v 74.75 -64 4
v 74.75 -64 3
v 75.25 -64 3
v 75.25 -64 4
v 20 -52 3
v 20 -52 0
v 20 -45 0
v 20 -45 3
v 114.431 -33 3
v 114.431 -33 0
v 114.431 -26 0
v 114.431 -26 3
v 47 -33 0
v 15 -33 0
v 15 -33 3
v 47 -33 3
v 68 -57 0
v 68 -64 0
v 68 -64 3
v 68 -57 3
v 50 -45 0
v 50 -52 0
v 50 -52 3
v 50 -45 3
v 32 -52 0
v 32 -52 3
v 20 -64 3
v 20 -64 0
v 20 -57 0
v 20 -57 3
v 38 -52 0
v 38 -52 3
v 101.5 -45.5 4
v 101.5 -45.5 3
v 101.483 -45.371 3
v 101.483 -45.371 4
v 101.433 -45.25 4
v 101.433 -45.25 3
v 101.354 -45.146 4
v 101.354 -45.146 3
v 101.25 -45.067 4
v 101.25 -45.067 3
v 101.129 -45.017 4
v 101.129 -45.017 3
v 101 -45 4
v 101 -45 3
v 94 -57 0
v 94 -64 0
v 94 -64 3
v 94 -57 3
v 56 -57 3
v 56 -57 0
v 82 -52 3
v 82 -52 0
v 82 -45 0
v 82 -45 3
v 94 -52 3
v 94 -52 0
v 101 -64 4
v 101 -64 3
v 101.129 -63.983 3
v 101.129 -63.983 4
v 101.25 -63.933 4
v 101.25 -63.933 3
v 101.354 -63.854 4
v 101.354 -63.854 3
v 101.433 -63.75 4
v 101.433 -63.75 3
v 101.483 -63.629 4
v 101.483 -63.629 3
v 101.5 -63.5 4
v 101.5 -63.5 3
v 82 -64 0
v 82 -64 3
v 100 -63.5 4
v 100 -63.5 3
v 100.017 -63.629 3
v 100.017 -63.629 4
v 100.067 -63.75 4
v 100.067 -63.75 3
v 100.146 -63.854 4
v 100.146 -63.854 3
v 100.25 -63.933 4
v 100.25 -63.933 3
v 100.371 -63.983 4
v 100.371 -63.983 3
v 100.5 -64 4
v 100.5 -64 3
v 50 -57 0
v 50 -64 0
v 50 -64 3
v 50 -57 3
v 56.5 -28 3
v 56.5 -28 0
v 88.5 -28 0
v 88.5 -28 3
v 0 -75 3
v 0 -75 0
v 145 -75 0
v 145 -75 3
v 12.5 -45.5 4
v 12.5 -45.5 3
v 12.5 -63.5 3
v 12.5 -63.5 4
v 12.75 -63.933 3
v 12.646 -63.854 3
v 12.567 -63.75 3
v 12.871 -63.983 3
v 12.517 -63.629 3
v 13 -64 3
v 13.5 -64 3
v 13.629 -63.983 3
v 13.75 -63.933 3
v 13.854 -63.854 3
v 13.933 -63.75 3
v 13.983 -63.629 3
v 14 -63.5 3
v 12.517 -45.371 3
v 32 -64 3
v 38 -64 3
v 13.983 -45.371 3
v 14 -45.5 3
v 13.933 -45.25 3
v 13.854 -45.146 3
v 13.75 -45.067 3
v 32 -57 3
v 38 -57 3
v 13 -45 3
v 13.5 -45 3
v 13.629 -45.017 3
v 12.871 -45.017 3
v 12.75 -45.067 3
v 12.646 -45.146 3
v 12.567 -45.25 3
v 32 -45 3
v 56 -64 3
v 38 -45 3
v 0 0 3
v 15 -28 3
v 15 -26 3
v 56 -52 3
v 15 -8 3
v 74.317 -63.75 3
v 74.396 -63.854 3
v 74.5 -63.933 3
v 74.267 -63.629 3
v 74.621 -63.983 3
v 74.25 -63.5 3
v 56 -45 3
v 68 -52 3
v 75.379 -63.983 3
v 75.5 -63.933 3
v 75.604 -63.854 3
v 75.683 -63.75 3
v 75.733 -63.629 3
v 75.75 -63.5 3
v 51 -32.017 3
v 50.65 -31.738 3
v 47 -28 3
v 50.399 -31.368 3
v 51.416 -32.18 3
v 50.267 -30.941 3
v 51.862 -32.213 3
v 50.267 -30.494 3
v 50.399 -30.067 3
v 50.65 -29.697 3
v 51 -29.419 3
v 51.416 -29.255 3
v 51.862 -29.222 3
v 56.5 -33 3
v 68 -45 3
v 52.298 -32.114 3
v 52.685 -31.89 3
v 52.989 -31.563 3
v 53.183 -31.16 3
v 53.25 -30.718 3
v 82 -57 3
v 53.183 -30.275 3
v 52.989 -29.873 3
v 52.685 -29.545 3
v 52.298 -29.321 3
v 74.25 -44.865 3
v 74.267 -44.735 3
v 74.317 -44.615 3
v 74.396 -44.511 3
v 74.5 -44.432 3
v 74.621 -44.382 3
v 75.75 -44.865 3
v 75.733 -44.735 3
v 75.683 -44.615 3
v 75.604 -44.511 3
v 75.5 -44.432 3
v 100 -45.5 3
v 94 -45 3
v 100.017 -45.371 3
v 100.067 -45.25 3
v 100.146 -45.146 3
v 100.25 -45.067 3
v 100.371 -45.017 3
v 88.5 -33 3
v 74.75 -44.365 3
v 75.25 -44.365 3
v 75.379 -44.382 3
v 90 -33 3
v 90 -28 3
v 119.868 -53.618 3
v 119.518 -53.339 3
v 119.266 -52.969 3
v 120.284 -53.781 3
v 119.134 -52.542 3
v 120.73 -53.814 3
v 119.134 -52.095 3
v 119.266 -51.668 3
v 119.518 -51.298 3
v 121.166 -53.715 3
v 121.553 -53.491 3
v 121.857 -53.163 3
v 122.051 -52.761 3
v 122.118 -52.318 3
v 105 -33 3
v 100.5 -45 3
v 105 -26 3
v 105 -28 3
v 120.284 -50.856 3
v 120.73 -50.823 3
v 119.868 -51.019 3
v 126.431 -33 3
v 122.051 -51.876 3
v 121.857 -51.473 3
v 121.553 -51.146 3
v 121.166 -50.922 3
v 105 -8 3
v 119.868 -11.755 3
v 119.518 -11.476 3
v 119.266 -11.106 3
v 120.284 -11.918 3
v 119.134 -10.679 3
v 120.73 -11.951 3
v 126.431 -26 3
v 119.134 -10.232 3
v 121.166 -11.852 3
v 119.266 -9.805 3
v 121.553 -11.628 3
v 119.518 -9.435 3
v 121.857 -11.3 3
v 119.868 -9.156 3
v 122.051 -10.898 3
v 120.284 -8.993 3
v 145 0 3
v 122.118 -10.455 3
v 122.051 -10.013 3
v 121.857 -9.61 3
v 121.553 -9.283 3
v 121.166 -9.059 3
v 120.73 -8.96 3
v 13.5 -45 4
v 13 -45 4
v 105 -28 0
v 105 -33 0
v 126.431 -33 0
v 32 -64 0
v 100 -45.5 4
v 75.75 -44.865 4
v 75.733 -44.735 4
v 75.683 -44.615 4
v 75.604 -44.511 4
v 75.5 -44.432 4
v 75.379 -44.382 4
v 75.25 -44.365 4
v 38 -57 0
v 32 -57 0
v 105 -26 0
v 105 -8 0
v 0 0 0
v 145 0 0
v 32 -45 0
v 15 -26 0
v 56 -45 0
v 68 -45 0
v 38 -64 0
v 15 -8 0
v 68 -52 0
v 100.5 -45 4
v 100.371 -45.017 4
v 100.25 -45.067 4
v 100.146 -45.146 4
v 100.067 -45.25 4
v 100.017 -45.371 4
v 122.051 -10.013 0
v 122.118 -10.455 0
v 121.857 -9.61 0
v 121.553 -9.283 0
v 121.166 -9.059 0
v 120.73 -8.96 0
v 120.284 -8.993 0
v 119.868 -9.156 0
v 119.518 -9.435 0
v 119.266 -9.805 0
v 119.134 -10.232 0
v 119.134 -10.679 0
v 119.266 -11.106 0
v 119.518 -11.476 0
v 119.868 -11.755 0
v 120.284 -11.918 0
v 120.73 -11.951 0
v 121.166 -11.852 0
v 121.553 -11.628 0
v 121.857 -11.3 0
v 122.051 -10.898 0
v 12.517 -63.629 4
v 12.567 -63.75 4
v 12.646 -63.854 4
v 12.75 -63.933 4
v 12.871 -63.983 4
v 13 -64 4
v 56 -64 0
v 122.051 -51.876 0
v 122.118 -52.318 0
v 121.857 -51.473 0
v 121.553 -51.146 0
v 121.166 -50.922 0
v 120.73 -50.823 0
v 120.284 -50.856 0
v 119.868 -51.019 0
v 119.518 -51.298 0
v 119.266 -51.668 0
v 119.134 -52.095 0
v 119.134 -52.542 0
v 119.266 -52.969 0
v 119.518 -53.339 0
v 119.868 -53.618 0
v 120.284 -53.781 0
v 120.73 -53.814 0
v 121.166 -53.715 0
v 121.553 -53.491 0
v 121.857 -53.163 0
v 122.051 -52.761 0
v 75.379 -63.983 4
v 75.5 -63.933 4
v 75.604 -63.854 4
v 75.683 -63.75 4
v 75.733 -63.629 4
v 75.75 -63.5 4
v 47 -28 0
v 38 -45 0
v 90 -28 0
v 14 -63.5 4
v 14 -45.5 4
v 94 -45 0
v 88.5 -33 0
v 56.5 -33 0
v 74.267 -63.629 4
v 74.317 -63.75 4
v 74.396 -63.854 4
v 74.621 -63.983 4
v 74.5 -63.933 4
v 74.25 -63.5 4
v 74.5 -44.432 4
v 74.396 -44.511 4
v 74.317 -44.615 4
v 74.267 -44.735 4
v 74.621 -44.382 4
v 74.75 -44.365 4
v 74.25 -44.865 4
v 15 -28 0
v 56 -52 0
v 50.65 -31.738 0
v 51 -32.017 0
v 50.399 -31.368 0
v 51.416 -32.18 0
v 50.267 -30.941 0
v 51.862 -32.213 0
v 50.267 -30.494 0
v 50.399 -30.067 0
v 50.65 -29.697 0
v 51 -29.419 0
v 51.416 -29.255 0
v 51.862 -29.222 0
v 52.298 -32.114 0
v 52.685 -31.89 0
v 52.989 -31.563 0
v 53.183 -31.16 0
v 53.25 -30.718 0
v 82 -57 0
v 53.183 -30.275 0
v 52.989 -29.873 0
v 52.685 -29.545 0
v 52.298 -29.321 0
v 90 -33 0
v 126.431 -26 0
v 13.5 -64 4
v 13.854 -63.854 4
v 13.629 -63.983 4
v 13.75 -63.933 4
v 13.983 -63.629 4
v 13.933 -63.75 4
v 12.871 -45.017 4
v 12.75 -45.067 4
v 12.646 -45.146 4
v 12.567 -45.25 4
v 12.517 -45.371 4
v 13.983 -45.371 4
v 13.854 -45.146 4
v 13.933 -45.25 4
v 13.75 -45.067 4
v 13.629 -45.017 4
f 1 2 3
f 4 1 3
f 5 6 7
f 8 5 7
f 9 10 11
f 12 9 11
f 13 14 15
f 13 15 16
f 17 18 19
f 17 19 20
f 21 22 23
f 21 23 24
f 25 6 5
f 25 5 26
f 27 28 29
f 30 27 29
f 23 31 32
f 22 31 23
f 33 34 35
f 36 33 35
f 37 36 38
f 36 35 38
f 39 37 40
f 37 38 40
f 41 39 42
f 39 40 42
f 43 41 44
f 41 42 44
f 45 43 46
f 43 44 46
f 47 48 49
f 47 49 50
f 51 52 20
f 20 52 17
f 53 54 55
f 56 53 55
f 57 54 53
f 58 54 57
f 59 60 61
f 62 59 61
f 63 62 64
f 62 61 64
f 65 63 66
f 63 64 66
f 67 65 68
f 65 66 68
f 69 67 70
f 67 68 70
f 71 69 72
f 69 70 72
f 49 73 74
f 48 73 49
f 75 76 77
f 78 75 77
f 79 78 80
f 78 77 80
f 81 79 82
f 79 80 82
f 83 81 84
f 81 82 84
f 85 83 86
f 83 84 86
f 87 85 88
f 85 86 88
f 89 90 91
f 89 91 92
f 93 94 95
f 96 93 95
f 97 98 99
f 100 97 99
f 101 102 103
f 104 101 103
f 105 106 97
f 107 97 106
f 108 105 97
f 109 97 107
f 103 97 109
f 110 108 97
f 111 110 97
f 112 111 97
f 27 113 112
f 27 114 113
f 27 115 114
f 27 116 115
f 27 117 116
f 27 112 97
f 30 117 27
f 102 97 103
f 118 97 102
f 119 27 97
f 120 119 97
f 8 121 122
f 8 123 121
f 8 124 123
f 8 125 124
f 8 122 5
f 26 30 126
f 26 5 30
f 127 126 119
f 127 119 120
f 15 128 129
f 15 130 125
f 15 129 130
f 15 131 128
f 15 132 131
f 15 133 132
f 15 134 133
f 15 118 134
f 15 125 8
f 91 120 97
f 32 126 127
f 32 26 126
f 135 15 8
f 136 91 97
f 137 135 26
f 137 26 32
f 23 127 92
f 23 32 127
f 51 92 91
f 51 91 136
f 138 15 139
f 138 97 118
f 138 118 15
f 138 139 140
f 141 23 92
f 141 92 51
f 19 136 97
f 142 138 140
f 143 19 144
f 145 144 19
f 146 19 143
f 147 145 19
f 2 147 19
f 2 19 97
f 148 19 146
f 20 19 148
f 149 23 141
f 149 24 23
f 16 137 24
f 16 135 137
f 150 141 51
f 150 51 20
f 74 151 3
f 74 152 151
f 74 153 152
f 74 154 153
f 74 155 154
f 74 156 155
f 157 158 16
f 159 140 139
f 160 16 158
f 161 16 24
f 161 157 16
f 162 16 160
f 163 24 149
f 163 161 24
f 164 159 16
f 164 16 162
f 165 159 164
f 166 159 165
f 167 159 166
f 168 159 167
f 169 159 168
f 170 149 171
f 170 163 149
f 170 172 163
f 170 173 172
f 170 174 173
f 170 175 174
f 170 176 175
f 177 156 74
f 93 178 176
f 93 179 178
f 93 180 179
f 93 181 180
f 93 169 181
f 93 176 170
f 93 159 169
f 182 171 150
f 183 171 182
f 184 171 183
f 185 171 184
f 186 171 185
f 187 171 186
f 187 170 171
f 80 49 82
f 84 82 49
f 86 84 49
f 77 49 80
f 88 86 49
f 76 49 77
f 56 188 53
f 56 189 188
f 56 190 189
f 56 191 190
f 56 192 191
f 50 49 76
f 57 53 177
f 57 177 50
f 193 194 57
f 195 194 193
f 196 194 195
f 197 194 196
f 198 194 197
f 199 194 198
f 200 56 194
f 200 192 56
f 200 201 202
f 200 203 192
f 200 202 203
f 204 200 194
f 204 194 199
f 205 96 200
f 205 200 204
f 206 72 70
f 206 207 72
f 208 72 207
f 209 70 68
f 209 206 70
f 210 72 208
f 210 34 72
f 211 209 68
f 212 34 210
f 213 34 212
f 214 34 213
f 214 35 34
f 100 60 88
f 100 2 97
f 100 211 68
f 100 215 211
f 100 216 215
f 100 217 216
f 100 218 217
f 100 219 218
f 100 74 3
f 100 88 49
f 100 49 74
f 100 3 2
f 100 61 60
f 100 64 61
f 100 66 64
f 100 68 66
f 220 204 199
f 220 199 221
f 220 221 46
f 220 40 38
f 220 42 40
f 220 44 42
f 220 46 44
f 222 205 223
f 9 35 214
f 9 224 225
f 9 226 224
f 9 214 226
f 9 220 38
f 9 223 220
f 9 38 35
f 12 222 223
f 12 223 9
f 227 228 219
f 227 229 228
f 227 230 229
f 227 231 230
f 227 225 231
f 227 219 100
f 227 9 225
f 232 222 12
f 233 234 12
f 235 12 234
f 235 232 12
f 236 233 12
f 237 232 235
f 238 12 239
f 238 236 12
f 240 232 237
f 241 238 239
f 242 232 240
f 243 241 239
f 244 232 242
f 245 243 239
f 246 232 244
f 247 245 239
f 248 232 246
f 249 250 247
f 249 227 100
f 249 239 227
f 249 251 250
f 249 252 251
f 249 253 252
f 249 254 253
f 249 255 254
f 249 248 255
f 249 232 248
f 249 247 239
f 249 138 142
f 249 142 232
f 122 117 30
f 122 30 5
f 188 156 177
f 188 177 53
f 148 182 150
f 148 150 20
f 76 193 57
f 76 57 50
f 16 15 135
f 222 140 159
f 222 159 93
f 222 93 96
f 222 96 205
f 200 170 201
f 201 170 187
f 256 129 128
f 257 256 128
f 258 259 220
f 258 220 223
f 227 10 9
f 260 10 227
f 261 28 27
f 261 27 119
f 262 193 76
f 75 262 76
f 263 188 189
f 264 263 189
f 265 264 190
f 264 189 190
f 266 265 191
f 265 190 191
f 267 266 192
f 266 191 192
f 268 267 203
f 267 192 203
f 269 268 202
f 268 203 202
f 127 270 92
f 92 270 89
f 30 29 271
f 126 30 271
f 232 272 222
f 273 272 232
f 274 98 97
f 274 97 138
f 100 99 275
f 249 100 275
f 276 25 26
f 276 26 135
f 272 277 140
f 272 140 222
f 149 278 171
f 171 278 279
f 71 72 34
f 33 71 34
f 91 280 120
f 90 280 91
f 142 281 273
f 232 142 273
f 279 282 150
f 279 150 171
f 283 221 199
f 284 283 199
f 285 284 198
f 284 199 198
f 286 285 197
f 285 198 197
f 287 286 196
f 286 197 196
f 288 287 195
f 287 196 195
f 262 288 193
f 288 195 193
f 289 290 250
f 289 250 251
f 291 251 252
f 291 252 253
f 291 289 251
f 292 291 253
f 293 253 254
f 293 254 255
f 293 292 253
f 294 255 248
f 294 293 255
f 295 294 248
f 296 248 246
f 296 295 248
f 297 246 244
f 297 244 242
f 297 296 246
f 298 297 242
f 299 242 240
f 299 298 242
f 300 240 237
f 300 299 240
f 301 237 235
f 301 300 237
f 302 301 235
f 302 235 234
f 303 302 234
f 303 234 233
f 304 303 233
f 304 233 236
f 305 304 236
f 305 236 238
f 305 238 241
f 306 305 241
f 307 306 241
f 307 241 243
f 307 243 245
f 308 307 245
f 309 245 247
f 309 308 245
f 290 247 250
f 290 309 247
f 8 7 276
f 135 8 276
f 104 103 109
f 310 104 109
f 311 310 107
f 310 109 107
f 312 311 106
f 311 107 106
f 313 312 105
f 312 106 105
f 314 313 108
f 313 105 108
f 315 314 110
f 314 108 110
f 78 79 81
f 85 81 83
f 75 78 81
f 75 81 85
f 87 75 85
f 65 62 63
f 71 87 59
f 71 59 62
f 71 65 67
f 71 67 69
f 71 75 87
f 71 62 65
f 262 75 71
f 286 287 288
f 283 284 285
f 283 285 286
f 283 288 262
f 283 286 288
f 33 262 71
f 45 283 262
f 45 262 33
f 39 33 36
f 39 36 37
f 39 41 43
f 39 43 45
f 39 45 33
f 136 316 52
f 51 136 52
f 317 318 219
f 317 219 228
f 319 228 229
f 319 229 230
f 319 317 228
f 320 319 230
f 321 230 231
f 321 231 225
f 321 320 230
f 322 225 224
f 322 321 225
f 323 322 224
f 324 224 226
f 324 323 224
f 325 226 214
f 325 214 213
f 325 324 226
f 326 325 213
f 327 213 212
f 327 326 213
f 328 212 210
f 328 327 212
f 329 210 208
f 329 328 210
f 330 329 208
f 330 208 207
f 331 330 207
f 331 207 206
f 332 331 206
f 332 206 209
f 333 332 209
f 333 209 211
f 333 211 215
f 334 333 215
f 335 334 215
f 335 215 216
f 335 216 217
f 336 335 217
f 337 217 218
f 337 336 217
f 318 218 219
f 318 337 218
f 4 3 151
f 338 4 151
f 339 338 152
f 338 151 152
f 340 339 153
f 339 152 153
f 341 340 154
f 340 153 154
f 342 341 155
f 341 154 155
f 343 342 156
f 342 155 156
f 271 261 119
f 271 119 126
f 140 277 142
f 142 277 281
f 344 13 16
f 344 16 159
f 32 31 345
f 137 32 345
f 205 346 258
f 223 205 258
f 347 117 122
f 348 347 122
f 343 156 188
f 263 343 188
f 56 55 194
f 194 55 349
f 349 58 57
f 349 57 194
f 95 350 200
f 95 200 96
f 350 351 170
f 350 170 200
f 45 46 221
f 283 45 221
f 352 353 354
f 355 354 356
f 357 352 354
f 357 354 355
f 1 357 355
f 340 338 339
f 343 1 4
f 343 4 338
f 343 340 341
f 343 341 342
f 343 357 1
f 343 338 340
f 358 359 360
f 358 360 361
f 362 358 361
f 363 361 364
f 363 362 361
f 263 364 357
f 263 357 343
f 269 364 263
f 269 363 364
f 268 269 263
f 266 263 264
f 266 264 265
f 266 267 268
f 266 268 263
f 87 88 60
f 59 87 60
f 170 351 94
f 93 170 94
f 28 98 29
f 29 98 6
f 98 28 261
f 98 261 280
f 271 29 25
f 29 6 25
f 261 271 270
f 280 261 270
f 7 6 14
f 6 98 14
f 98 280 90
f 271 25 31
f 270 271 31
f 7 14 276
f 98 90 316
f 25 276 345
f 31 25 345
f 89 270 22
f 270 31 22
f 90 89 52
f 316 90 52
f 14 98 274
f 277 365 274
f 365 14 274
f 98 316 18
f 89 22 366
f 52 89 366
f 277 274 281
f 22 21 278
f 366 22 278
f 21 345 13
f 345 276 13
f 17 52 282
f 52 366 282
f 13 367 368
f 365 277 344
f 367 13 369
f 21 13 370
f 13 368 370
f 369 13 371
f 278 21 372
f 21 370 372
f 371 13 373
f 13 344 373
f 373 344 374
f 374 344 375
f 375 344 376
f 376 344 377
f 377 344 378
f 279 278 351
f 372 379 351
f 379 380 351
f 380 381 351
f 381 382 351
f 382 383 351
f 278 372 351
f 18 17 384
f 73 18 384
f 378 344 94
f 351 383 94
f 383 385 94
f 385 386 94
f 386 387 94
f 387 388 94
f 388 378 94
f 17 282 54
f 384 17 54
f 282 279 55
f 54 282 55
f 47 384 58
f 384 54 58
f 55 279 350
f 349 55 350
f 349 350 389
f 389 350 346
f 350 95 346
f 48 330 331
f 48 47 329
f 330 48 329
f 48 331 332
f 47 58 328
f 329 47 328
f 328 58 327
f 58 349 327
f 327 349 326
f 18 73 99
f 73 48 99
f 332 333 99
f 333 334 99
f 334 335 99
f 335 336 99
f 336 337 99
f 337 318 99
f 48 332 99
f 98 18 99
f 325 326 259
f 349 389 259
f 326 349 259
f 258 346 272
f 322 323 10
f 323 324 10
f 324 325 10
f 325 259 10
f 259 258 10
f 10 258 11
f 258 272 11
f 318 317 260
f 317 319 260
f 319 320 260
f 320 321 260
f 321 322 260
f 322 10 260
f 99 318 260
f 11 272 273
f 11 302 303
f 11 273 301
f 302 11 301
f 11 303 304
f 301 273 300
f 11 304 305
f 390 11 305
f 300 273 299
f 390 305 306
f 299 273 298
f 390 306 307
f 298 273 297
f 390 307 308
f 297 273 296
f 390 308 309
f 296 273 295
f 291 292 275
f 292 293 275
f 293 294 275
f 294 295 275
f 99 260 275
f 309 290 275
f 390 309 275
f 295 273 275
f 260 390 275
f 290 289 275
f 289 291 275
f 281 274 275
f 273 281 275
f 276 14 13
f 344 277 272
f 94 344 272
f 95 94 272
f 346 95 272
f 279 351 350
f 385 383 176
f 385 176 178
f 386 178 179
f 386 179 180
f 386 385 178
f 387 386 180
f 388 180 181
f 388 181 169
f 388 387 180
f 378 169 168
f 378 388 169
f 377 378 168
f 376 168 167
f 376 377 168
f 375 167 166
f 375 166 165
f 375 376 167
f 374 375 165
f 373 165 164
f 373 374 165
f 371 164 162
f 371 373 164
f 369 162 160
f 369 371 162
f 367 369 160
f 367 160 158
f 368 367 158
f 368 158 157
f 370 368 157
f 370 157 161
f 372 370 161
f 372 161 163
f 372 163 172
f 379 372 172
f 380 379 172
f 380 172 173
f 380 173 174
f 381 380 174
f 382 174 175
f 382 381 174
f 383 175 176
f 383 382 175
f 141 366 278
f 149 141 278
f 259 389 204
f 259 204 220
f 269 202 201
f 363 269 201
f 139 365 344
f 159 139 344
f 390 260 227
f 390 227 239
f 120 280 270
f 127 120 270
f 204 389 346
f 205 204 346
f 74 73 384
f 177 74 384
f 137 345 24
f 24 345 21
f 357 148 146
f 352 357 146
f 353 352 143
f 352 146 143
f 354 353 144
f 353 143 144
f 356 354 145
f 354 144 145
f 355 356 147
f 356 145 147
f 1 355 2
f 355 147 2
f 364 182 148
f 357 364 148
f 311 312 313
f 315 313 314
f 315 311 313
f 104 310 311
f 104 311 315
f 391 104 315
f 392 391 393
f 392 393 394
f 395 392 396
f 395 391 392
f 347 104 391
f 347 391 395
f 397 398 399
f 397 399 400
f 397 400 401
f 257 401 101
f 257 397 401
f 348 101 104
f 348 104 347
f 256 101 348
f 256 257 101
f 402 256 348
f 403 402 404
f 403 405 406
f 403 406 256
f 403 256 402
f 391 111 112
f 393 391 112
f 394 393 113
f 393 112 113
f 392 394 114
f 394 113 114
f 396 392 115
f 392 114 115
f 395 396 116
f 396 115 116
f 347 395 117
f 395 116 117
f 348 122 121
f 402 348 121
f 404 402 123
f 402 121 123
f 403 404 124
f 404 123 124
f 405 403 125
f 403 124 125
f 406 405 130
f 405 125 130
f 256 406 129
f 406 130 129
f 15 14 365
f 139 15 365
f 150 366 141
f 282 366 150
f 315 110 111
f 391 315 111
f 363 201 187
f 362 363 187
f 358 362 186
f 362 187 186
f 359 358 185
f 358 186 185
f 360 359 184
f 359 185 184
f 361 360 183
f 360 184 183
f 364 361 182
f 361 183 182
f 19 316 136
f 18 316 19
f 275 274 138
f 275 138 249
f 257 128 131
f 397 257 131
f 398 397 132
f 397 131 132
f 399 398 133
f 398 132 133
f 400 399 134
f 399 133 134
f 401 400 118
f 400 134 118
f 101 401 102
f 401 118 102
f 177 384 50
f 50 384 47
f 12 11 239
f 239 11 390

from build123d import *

# Parameters (mm, degrees)
F0_W     = 145
F0_H     = 75
F0_W_2   = 12
F0_H_2   = 7
F0_R     = 1.5
F0_W_3   = 32
F0_H_3   = 5
F0_W_4   = 90
F0_H_4   = 18
F0_W_5   = 15
F1_DEPTH = 3
F3_DEPTH = 1


with BuildPart() as f1:
    # F0 (on Top) → F1 (new body)
    with BuildSketch(Plane.XY):
        with Locations((72.5, -37.5)):
            Rectangle(F0_W, F0_H)
        with Locations((26, -60.5)):
            Rectangle(F0_W_2, F0_H_2, mode=Mode.SUBTRACT)
        with Locations((44, -60.5)):
            Rectangle(F0_W_2, F0_H_2, mode=Mode.SUBTRACT)
        with Locations((62, -60.5)):
            Rectangle(F0_W_2, F0_H_2, mode=Mode.SUBTRACT)
        with Locations((26, -48.5)):
            Rectangle(F0_W_2, F0_H_2, mode=Mode.SUBTRACT)
        with Locations((44, -48.5)):
            Rectangle(F0_W_2, F0_H_2, mode=Mode.SUBTRACT)
        with Locations((62, -48.5)):
            Rectangle(F0_W_2, F0_H_2, mode=Mode.SUBTRACT)
        with Locations((88, -60.5)):
            Rectangle(F0_W_2, F0_H_2, mode=Mode.SUBTRACT)
        with Locations((88, -48.5)):
            Rectangle(F0_W_2, F0_H_2, mode=Mode.SUBTRACT)
        with Locations((120.617509, -52.318472)):
            Circle(F0_R, mode=Mode.SUBTRACT)
        with Locations((31, -30.5)):
            Rectangle(F0_W_3, F0_H_3, mode=Mode.SUBTRACT)
        with Locations((51.75, -30.71763)):
            Circle(F0_R, mode=Mode.SUBTRACT)
        with Locations((60, -17)):
            Rectangle(F0_W_4, F0_H_4, mode=Mode.SUBTRACT)
        with Locations((72.5, -30.5)):
            Rectangle(F0_W_3, F0_H_3, mode=Mode.SUBTRACT)
        with Locations((97.5, -30.5)):
            Rectangle(F0_W_5, F0_H_3, mode=Mode.SUBTRACT)
        with Locations((120.430524, -29.5)):
            Rectangle(F0_W_2, F0_H_2, mode=Mode.SUBTRACT)
        with Locations((120.617509, -10.455477)):
            Circle(F0_R, mode=Mode.SUBTRACT)
    extrude(amount=F1_DEPTH)

    # F2 (on face) → F3 (join)
    with BuildSketch(Plane.XY.offset(3)):
        with BuildLine():
            Line((13.5, -45), (13, -45))
            ThreePointArc((13, -45), (12.646447, -45.146447), (12.5, -45.5))
            Line((12.5, -45.5), (12.5, -63.5))
            ThreePointArc((12.5, -63.5), (12.646447, -63.853553), (13, -64))
            Line((13, -64), (13.5, -64))
            ThreePointArc((13.5, -64), (13.853553, -63.853553), (14, -63.5))
            Line((14, -63.5), (14, -45.5))
            ThreePointArc((14, -45.5), (13.853553, -45.146447), (13.5, -45))
        make_face()
        with BuildLine():
            Line((101, -45), (100.5, -45))
            ThreePointArc((100.5, -45), (100.146447, -45.146447), (100, -45.5))
            Line((100, -45.5), (100, -63.5))
            ThreePointArc((100, -63.5), (100.146447, -63.853553), (100.5, -64))
            Line((100.5, -64), (101, -64))
            ThreePointArc((101, -64), (101.353553, -63.853553), (101.5, -63.5))
            Line((101.5, -63.5), (101.5, -45.5))
            ThreePointArc((101.5, -45.5), (101.353553, -45.146447), (101, -45))
        make_face()
        with BuildLine():
            Line((75.25, -44.364751), (74.75, -44.364751))
            ThreePointArc((74.75, -44.364751), (74.396447, -44.511198), (74.25, -44.864751))
            Line((74.25, -44.864751), (74.25, -63.5))
            ThreePointArc((74.25, -63.5), (74.396447, -63.853553), (74.75, -64))
            Line((74.75, -64), (75.25, -64))
            ThreePointArc((75.25, -64), (75.603553, -63.853553), (75.75, -63.5))
            Line((75.75, -63.5), (75.75, -44.864751))
            ThreePointArc((75.75, -44.864751), (75.603553, -44.511198), (75.25, -44.364751))
        make_face()
    extrude(amount=F3_DEPTH)


solid = f1.part
